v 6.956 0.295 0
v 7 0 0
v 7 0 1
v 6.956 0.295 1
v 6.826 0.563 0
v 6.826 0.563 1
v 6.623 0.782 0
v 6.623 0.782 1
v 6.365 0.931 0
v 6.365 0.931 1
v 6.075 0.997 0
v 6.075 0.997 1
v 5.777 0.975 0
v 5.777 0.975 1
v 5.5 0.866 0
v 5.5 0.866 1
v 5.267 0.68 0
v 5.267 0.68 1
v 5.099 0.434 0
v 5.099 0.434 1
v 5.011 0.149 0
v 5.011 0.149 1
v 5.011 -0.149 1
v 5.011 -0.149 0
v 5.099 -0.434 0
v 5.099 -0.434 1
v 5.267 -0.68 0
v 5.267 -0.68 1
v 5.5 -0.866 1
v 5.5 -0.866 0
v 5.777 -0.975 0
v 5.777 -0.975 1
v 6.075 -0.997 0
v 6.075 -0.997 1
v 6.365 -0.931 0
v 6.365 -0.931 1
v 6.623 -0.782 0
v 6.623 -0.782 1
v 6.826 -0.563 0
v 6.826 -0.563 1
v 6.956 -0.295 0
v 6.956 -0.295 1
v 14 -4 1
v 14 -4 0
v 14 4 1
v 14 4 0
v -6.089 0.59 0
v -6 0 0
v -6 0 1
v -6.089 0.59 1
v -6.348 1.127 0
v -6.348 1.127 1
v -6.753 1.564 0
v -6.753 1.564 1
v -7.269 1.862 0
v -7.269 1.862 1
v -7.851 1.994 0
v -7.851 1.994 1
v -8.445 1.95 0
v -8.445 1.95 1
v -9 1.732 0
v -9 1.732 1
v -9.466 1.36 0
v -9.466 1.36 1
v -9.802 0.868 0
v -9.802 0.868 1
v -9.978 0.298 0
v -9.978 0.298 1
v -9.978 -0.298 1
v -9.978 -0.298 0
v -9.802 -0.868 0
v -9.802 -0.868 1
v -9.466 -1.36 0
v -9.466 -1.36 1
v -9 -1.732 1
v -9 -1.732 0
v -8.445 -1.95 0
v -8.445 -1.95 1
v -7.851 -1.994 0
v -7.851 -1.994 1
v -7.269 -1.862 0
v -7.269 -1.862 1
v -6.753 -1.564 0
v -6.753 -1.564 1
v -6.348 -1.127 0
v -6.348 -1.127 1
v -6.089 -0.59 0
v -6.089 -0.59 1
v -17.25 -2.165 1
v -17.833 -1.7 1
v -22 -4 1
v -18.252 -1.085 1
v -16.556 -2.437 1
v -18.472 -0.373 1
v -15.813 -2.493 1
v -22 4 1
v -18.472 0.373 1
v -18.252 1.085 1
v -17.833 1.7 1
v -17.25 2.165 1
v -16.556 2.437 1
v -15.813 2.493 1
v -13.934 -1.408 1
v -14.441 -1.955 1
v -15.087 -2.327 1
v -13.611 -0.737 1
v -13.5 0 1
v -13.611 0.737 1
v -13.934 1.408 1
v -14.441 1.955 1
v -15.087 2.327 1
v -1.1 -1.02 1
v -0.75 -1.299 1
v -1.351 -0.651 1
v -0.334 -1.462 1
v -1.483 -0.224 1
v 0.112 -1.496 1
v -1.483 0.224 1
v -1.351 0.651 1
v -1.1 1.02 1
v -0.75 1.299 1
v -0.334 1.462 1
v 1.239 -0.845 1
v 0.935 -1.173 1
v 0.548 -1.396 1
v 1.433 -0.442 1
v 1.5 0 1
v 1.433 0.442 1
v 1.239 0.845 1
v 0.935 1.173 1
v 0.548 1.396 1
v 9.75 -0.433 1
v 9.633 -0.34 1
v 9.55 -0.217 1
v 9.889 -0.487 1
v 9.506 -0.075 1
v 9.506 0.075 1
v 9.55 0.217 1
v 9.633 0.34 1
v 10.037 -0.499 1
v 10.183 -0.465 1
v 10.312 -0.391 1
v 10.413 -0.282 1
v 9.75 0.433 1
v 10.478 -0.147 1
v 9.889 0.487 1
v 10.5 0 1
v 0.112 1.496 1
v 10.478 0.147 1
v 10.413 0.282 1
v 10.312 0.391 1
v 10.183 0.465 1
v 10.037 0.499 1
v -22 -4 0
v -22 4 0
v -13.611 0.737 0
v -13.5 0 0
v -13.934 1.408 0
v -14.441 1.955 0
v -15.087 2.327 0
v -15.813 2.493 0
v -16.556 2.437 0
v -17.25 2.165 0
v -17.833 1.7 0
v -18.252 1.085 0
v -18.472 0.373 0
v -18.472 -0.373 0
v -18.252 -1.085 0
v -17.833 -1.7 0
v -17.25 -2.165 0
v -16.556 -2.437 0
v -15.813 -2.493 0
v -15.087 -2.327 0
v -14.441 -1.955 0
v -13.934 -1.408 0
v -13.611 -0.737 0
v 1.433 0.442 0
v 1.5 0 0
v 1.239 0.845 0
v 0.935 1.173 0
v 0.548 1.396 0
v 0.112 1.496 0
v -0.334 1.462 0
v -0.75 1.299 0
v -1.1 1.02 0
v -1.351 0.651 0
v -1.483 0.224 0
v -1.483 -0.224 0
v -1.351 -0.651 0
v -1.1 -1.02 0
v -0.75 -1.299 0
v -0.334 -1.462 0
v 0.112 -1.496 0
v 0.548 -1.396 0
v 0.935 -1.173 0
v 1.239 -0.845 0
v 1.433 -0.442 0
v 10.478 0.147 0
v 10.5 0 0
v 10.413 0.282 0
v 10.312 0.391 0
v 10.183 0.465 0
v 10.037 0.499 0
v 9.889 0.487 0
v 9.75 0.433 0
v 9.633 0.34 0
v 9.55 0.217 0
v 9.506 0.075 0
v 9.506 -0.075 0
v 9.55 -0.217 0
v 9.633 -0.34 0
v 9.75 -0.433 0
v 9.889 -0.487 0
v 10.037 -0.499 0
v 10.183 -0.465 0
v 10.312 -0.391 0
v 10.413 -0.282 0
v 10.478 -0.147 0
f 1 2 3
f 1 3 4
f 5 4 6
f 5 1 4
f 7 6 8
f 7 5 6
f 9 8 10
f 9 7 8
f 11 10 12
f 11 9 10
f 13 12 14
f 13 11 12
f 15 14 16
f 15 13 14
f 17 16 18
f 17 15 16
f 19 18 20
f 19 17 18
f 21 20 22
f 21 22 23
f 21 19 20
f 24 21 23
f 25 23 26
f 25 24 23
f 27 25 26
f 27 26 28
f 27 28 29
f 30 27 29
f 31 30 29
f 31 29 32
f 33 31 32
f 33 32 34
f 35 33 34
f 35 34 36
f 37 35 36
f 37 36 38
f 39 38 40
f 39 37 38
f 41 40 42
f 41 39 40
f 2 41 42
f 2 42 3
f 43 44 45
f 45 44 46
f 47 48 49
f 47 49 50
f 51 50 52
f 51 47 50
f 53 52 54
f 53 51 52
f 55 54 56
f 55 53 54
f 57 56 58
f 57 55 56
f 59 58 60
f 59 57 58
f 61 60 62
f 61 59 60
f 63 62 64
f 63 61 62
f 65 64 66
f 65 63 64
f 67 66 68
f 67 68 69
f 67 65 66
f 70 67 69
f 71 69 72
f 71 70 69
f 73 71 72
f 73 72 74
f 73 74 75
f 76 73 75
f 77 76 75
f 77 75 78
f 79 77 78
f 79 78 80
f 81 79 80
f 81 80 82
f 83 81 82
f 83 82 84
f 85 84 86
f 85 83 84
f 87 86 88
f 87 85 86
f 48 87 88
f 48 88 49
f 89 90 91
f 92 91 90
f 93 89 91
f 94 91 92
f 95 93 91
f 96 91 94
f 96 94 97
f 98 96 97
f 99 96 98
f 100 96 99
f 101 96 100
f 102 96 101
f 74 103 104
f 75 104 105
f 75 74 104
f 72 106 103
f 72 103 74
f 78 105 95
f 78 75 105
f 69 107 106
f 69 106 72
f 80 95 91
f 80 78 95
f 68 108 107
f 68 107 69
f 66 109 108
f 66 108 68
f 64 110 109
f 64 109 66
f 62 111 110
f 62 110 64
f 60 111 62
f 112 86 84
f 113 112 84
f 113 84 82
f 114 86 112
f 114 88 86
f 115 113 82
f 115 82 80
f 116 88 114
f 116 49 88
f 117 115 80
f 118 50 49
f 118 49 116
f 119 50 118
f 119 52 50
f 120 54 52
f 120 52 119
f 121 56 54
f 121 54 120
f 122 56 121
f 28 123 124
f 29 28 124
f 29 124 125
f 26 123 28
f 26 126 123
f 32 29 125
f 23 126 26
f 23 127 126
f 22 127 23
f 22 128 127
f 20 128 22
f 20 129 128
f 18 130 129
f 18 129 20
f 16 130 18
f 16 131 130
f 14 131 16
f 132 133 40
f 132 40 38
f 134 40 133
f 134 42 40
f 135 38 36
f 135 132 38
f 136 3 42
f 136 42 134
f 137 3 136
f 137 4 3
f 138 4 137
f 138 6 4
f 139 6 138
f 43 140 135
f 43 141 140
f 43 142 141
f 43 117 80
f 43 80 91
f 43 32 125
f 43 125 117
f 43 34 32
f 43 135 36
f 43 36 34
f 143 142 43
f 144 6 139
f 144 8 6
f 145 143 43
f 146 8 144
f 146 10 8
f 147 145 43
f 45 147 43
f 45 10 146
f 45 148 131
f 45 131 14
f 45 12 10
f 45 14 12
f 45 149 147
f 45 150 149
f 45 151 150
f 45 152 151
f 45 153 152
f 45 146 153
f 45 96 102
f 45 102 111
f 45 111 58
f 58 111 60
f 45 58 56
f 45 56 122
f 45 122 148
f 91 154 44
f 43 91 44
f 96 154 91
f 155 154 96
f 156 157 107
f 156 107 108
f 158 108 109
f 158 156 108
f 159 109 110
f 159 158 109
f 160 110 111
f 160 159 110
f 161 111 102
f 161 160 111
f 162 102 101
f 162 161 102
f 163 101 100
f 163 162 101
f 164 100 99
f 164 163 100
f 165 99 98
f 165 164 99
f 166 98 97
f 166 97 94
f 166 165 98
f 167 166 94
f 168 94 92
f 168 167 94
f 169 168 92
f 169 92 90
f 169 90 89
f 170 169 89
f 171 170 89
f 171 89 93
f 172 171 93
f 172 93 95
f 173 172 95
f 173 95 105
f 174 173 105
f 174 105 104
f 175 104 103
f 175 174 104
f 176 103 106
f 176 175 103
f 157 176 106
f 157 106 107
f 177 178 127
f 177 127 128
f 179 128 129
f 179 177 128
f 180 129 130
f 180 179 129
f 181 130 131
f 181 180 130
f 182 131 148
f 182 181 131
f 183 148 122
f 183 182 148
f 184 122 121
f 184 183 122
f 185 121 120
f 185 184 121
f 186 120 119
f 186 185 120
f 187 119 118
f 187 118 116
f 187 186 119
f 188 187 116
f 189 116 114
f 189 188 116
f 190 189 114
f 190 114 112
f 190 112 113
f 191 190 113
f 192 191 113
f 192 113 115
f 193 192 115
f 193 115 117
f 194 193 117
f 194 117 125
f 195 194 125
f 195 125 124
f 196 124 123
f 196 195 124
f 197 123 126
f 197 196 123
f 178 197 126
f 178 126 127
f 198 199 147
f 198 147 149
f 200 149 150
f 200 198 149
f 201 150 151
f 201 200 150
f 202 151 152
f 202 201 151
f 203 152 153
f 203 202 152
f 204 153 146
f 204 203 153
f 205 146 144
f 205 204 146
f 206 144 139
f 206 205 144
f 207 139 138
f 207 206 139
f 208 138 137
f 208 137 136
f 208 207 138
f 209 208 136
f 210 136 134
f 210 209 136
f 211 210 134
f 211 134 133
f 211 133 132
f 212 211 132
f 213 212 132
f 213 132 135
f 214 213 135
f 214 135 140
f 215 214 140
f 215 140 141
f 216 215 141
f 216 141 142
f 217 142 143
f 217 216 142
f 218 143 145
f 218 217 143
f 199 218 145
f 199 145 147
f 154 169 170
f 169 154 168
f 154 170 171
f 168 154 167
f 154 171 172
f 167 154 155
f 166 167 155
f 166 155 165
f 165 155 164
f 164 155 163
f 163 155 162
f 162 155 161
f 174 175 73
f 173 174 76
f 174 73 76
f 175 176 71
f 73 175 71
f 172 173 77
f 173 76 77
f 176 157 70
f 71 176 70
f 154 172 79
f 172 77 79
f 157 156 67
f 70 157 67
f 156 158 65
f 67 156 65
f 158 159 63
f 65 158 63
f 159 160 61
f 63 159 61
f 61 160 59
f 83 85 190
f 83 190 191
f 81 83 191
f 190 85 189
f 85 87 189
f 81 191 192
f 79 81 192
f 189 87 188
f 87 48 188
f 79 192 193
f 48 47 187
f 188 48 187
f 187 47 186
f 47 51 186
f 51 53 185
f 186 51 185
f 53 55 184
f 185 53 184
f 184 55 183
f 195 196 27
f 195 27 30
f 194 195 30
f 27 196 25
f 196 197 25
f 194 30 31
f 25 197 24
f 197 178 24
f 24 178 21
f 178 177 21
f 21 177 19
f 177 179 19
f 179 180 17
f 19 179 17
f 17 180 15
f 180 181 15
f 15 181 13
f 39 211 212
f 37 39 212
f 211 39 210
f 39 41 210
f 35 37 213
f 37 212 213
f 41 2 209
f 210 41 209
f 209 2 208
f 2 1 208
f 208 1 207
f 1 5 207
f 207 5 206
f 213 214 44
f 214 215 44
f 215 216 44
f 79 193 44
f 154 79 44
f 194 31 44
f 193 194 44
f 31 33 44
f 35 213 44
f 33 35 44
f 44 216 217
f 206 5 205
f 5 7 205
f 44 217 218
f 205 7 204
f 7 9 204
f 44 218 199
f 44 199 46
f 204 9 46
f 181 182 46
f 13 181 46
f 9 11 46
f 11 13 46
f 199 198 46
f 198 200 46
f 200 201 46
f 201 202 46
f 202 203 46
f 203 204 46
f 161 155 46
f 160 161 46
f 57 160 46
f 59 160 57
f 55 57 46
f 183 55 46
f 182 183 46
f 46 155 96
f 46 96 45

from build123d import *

# Parameters (mm, degrees)
F0_W     = 36
F0_H     = 8
F0_R     = 2.5
F0_R_2   = 2
F0_R_3   = 1.5
F0_R_4   = 1
F0_R_5   = 0.5
F1_DEPTH = 1


with BuildPart() as f1:
    # F0 (on Top) → F1 (new body)
    with BuildSketch(Plane.XY):
        with Locations((-4, 0)):
            Rectangle(F0_W, F0_H)
        with Locations((-16, 0)):
            Circle(F0_R, mode=Mode.SUBTRACT)
        with Locations((-8, 0)):
            Circle(F0_R_2, mode=Mode.SUBTRACT)
        Circle(F0_R_3, mode=Mode.SUBTRACT)
        with Locations((6, 0)):
            Circle(F0_R_4, mode=Mode.SUBTRACT)
        with Locations((10, 0)):
            Circle(F0_R_5, mode=Mode.SUBTRACT)
    extrude(amount=F1_DEPTH)


solid = f1.part
